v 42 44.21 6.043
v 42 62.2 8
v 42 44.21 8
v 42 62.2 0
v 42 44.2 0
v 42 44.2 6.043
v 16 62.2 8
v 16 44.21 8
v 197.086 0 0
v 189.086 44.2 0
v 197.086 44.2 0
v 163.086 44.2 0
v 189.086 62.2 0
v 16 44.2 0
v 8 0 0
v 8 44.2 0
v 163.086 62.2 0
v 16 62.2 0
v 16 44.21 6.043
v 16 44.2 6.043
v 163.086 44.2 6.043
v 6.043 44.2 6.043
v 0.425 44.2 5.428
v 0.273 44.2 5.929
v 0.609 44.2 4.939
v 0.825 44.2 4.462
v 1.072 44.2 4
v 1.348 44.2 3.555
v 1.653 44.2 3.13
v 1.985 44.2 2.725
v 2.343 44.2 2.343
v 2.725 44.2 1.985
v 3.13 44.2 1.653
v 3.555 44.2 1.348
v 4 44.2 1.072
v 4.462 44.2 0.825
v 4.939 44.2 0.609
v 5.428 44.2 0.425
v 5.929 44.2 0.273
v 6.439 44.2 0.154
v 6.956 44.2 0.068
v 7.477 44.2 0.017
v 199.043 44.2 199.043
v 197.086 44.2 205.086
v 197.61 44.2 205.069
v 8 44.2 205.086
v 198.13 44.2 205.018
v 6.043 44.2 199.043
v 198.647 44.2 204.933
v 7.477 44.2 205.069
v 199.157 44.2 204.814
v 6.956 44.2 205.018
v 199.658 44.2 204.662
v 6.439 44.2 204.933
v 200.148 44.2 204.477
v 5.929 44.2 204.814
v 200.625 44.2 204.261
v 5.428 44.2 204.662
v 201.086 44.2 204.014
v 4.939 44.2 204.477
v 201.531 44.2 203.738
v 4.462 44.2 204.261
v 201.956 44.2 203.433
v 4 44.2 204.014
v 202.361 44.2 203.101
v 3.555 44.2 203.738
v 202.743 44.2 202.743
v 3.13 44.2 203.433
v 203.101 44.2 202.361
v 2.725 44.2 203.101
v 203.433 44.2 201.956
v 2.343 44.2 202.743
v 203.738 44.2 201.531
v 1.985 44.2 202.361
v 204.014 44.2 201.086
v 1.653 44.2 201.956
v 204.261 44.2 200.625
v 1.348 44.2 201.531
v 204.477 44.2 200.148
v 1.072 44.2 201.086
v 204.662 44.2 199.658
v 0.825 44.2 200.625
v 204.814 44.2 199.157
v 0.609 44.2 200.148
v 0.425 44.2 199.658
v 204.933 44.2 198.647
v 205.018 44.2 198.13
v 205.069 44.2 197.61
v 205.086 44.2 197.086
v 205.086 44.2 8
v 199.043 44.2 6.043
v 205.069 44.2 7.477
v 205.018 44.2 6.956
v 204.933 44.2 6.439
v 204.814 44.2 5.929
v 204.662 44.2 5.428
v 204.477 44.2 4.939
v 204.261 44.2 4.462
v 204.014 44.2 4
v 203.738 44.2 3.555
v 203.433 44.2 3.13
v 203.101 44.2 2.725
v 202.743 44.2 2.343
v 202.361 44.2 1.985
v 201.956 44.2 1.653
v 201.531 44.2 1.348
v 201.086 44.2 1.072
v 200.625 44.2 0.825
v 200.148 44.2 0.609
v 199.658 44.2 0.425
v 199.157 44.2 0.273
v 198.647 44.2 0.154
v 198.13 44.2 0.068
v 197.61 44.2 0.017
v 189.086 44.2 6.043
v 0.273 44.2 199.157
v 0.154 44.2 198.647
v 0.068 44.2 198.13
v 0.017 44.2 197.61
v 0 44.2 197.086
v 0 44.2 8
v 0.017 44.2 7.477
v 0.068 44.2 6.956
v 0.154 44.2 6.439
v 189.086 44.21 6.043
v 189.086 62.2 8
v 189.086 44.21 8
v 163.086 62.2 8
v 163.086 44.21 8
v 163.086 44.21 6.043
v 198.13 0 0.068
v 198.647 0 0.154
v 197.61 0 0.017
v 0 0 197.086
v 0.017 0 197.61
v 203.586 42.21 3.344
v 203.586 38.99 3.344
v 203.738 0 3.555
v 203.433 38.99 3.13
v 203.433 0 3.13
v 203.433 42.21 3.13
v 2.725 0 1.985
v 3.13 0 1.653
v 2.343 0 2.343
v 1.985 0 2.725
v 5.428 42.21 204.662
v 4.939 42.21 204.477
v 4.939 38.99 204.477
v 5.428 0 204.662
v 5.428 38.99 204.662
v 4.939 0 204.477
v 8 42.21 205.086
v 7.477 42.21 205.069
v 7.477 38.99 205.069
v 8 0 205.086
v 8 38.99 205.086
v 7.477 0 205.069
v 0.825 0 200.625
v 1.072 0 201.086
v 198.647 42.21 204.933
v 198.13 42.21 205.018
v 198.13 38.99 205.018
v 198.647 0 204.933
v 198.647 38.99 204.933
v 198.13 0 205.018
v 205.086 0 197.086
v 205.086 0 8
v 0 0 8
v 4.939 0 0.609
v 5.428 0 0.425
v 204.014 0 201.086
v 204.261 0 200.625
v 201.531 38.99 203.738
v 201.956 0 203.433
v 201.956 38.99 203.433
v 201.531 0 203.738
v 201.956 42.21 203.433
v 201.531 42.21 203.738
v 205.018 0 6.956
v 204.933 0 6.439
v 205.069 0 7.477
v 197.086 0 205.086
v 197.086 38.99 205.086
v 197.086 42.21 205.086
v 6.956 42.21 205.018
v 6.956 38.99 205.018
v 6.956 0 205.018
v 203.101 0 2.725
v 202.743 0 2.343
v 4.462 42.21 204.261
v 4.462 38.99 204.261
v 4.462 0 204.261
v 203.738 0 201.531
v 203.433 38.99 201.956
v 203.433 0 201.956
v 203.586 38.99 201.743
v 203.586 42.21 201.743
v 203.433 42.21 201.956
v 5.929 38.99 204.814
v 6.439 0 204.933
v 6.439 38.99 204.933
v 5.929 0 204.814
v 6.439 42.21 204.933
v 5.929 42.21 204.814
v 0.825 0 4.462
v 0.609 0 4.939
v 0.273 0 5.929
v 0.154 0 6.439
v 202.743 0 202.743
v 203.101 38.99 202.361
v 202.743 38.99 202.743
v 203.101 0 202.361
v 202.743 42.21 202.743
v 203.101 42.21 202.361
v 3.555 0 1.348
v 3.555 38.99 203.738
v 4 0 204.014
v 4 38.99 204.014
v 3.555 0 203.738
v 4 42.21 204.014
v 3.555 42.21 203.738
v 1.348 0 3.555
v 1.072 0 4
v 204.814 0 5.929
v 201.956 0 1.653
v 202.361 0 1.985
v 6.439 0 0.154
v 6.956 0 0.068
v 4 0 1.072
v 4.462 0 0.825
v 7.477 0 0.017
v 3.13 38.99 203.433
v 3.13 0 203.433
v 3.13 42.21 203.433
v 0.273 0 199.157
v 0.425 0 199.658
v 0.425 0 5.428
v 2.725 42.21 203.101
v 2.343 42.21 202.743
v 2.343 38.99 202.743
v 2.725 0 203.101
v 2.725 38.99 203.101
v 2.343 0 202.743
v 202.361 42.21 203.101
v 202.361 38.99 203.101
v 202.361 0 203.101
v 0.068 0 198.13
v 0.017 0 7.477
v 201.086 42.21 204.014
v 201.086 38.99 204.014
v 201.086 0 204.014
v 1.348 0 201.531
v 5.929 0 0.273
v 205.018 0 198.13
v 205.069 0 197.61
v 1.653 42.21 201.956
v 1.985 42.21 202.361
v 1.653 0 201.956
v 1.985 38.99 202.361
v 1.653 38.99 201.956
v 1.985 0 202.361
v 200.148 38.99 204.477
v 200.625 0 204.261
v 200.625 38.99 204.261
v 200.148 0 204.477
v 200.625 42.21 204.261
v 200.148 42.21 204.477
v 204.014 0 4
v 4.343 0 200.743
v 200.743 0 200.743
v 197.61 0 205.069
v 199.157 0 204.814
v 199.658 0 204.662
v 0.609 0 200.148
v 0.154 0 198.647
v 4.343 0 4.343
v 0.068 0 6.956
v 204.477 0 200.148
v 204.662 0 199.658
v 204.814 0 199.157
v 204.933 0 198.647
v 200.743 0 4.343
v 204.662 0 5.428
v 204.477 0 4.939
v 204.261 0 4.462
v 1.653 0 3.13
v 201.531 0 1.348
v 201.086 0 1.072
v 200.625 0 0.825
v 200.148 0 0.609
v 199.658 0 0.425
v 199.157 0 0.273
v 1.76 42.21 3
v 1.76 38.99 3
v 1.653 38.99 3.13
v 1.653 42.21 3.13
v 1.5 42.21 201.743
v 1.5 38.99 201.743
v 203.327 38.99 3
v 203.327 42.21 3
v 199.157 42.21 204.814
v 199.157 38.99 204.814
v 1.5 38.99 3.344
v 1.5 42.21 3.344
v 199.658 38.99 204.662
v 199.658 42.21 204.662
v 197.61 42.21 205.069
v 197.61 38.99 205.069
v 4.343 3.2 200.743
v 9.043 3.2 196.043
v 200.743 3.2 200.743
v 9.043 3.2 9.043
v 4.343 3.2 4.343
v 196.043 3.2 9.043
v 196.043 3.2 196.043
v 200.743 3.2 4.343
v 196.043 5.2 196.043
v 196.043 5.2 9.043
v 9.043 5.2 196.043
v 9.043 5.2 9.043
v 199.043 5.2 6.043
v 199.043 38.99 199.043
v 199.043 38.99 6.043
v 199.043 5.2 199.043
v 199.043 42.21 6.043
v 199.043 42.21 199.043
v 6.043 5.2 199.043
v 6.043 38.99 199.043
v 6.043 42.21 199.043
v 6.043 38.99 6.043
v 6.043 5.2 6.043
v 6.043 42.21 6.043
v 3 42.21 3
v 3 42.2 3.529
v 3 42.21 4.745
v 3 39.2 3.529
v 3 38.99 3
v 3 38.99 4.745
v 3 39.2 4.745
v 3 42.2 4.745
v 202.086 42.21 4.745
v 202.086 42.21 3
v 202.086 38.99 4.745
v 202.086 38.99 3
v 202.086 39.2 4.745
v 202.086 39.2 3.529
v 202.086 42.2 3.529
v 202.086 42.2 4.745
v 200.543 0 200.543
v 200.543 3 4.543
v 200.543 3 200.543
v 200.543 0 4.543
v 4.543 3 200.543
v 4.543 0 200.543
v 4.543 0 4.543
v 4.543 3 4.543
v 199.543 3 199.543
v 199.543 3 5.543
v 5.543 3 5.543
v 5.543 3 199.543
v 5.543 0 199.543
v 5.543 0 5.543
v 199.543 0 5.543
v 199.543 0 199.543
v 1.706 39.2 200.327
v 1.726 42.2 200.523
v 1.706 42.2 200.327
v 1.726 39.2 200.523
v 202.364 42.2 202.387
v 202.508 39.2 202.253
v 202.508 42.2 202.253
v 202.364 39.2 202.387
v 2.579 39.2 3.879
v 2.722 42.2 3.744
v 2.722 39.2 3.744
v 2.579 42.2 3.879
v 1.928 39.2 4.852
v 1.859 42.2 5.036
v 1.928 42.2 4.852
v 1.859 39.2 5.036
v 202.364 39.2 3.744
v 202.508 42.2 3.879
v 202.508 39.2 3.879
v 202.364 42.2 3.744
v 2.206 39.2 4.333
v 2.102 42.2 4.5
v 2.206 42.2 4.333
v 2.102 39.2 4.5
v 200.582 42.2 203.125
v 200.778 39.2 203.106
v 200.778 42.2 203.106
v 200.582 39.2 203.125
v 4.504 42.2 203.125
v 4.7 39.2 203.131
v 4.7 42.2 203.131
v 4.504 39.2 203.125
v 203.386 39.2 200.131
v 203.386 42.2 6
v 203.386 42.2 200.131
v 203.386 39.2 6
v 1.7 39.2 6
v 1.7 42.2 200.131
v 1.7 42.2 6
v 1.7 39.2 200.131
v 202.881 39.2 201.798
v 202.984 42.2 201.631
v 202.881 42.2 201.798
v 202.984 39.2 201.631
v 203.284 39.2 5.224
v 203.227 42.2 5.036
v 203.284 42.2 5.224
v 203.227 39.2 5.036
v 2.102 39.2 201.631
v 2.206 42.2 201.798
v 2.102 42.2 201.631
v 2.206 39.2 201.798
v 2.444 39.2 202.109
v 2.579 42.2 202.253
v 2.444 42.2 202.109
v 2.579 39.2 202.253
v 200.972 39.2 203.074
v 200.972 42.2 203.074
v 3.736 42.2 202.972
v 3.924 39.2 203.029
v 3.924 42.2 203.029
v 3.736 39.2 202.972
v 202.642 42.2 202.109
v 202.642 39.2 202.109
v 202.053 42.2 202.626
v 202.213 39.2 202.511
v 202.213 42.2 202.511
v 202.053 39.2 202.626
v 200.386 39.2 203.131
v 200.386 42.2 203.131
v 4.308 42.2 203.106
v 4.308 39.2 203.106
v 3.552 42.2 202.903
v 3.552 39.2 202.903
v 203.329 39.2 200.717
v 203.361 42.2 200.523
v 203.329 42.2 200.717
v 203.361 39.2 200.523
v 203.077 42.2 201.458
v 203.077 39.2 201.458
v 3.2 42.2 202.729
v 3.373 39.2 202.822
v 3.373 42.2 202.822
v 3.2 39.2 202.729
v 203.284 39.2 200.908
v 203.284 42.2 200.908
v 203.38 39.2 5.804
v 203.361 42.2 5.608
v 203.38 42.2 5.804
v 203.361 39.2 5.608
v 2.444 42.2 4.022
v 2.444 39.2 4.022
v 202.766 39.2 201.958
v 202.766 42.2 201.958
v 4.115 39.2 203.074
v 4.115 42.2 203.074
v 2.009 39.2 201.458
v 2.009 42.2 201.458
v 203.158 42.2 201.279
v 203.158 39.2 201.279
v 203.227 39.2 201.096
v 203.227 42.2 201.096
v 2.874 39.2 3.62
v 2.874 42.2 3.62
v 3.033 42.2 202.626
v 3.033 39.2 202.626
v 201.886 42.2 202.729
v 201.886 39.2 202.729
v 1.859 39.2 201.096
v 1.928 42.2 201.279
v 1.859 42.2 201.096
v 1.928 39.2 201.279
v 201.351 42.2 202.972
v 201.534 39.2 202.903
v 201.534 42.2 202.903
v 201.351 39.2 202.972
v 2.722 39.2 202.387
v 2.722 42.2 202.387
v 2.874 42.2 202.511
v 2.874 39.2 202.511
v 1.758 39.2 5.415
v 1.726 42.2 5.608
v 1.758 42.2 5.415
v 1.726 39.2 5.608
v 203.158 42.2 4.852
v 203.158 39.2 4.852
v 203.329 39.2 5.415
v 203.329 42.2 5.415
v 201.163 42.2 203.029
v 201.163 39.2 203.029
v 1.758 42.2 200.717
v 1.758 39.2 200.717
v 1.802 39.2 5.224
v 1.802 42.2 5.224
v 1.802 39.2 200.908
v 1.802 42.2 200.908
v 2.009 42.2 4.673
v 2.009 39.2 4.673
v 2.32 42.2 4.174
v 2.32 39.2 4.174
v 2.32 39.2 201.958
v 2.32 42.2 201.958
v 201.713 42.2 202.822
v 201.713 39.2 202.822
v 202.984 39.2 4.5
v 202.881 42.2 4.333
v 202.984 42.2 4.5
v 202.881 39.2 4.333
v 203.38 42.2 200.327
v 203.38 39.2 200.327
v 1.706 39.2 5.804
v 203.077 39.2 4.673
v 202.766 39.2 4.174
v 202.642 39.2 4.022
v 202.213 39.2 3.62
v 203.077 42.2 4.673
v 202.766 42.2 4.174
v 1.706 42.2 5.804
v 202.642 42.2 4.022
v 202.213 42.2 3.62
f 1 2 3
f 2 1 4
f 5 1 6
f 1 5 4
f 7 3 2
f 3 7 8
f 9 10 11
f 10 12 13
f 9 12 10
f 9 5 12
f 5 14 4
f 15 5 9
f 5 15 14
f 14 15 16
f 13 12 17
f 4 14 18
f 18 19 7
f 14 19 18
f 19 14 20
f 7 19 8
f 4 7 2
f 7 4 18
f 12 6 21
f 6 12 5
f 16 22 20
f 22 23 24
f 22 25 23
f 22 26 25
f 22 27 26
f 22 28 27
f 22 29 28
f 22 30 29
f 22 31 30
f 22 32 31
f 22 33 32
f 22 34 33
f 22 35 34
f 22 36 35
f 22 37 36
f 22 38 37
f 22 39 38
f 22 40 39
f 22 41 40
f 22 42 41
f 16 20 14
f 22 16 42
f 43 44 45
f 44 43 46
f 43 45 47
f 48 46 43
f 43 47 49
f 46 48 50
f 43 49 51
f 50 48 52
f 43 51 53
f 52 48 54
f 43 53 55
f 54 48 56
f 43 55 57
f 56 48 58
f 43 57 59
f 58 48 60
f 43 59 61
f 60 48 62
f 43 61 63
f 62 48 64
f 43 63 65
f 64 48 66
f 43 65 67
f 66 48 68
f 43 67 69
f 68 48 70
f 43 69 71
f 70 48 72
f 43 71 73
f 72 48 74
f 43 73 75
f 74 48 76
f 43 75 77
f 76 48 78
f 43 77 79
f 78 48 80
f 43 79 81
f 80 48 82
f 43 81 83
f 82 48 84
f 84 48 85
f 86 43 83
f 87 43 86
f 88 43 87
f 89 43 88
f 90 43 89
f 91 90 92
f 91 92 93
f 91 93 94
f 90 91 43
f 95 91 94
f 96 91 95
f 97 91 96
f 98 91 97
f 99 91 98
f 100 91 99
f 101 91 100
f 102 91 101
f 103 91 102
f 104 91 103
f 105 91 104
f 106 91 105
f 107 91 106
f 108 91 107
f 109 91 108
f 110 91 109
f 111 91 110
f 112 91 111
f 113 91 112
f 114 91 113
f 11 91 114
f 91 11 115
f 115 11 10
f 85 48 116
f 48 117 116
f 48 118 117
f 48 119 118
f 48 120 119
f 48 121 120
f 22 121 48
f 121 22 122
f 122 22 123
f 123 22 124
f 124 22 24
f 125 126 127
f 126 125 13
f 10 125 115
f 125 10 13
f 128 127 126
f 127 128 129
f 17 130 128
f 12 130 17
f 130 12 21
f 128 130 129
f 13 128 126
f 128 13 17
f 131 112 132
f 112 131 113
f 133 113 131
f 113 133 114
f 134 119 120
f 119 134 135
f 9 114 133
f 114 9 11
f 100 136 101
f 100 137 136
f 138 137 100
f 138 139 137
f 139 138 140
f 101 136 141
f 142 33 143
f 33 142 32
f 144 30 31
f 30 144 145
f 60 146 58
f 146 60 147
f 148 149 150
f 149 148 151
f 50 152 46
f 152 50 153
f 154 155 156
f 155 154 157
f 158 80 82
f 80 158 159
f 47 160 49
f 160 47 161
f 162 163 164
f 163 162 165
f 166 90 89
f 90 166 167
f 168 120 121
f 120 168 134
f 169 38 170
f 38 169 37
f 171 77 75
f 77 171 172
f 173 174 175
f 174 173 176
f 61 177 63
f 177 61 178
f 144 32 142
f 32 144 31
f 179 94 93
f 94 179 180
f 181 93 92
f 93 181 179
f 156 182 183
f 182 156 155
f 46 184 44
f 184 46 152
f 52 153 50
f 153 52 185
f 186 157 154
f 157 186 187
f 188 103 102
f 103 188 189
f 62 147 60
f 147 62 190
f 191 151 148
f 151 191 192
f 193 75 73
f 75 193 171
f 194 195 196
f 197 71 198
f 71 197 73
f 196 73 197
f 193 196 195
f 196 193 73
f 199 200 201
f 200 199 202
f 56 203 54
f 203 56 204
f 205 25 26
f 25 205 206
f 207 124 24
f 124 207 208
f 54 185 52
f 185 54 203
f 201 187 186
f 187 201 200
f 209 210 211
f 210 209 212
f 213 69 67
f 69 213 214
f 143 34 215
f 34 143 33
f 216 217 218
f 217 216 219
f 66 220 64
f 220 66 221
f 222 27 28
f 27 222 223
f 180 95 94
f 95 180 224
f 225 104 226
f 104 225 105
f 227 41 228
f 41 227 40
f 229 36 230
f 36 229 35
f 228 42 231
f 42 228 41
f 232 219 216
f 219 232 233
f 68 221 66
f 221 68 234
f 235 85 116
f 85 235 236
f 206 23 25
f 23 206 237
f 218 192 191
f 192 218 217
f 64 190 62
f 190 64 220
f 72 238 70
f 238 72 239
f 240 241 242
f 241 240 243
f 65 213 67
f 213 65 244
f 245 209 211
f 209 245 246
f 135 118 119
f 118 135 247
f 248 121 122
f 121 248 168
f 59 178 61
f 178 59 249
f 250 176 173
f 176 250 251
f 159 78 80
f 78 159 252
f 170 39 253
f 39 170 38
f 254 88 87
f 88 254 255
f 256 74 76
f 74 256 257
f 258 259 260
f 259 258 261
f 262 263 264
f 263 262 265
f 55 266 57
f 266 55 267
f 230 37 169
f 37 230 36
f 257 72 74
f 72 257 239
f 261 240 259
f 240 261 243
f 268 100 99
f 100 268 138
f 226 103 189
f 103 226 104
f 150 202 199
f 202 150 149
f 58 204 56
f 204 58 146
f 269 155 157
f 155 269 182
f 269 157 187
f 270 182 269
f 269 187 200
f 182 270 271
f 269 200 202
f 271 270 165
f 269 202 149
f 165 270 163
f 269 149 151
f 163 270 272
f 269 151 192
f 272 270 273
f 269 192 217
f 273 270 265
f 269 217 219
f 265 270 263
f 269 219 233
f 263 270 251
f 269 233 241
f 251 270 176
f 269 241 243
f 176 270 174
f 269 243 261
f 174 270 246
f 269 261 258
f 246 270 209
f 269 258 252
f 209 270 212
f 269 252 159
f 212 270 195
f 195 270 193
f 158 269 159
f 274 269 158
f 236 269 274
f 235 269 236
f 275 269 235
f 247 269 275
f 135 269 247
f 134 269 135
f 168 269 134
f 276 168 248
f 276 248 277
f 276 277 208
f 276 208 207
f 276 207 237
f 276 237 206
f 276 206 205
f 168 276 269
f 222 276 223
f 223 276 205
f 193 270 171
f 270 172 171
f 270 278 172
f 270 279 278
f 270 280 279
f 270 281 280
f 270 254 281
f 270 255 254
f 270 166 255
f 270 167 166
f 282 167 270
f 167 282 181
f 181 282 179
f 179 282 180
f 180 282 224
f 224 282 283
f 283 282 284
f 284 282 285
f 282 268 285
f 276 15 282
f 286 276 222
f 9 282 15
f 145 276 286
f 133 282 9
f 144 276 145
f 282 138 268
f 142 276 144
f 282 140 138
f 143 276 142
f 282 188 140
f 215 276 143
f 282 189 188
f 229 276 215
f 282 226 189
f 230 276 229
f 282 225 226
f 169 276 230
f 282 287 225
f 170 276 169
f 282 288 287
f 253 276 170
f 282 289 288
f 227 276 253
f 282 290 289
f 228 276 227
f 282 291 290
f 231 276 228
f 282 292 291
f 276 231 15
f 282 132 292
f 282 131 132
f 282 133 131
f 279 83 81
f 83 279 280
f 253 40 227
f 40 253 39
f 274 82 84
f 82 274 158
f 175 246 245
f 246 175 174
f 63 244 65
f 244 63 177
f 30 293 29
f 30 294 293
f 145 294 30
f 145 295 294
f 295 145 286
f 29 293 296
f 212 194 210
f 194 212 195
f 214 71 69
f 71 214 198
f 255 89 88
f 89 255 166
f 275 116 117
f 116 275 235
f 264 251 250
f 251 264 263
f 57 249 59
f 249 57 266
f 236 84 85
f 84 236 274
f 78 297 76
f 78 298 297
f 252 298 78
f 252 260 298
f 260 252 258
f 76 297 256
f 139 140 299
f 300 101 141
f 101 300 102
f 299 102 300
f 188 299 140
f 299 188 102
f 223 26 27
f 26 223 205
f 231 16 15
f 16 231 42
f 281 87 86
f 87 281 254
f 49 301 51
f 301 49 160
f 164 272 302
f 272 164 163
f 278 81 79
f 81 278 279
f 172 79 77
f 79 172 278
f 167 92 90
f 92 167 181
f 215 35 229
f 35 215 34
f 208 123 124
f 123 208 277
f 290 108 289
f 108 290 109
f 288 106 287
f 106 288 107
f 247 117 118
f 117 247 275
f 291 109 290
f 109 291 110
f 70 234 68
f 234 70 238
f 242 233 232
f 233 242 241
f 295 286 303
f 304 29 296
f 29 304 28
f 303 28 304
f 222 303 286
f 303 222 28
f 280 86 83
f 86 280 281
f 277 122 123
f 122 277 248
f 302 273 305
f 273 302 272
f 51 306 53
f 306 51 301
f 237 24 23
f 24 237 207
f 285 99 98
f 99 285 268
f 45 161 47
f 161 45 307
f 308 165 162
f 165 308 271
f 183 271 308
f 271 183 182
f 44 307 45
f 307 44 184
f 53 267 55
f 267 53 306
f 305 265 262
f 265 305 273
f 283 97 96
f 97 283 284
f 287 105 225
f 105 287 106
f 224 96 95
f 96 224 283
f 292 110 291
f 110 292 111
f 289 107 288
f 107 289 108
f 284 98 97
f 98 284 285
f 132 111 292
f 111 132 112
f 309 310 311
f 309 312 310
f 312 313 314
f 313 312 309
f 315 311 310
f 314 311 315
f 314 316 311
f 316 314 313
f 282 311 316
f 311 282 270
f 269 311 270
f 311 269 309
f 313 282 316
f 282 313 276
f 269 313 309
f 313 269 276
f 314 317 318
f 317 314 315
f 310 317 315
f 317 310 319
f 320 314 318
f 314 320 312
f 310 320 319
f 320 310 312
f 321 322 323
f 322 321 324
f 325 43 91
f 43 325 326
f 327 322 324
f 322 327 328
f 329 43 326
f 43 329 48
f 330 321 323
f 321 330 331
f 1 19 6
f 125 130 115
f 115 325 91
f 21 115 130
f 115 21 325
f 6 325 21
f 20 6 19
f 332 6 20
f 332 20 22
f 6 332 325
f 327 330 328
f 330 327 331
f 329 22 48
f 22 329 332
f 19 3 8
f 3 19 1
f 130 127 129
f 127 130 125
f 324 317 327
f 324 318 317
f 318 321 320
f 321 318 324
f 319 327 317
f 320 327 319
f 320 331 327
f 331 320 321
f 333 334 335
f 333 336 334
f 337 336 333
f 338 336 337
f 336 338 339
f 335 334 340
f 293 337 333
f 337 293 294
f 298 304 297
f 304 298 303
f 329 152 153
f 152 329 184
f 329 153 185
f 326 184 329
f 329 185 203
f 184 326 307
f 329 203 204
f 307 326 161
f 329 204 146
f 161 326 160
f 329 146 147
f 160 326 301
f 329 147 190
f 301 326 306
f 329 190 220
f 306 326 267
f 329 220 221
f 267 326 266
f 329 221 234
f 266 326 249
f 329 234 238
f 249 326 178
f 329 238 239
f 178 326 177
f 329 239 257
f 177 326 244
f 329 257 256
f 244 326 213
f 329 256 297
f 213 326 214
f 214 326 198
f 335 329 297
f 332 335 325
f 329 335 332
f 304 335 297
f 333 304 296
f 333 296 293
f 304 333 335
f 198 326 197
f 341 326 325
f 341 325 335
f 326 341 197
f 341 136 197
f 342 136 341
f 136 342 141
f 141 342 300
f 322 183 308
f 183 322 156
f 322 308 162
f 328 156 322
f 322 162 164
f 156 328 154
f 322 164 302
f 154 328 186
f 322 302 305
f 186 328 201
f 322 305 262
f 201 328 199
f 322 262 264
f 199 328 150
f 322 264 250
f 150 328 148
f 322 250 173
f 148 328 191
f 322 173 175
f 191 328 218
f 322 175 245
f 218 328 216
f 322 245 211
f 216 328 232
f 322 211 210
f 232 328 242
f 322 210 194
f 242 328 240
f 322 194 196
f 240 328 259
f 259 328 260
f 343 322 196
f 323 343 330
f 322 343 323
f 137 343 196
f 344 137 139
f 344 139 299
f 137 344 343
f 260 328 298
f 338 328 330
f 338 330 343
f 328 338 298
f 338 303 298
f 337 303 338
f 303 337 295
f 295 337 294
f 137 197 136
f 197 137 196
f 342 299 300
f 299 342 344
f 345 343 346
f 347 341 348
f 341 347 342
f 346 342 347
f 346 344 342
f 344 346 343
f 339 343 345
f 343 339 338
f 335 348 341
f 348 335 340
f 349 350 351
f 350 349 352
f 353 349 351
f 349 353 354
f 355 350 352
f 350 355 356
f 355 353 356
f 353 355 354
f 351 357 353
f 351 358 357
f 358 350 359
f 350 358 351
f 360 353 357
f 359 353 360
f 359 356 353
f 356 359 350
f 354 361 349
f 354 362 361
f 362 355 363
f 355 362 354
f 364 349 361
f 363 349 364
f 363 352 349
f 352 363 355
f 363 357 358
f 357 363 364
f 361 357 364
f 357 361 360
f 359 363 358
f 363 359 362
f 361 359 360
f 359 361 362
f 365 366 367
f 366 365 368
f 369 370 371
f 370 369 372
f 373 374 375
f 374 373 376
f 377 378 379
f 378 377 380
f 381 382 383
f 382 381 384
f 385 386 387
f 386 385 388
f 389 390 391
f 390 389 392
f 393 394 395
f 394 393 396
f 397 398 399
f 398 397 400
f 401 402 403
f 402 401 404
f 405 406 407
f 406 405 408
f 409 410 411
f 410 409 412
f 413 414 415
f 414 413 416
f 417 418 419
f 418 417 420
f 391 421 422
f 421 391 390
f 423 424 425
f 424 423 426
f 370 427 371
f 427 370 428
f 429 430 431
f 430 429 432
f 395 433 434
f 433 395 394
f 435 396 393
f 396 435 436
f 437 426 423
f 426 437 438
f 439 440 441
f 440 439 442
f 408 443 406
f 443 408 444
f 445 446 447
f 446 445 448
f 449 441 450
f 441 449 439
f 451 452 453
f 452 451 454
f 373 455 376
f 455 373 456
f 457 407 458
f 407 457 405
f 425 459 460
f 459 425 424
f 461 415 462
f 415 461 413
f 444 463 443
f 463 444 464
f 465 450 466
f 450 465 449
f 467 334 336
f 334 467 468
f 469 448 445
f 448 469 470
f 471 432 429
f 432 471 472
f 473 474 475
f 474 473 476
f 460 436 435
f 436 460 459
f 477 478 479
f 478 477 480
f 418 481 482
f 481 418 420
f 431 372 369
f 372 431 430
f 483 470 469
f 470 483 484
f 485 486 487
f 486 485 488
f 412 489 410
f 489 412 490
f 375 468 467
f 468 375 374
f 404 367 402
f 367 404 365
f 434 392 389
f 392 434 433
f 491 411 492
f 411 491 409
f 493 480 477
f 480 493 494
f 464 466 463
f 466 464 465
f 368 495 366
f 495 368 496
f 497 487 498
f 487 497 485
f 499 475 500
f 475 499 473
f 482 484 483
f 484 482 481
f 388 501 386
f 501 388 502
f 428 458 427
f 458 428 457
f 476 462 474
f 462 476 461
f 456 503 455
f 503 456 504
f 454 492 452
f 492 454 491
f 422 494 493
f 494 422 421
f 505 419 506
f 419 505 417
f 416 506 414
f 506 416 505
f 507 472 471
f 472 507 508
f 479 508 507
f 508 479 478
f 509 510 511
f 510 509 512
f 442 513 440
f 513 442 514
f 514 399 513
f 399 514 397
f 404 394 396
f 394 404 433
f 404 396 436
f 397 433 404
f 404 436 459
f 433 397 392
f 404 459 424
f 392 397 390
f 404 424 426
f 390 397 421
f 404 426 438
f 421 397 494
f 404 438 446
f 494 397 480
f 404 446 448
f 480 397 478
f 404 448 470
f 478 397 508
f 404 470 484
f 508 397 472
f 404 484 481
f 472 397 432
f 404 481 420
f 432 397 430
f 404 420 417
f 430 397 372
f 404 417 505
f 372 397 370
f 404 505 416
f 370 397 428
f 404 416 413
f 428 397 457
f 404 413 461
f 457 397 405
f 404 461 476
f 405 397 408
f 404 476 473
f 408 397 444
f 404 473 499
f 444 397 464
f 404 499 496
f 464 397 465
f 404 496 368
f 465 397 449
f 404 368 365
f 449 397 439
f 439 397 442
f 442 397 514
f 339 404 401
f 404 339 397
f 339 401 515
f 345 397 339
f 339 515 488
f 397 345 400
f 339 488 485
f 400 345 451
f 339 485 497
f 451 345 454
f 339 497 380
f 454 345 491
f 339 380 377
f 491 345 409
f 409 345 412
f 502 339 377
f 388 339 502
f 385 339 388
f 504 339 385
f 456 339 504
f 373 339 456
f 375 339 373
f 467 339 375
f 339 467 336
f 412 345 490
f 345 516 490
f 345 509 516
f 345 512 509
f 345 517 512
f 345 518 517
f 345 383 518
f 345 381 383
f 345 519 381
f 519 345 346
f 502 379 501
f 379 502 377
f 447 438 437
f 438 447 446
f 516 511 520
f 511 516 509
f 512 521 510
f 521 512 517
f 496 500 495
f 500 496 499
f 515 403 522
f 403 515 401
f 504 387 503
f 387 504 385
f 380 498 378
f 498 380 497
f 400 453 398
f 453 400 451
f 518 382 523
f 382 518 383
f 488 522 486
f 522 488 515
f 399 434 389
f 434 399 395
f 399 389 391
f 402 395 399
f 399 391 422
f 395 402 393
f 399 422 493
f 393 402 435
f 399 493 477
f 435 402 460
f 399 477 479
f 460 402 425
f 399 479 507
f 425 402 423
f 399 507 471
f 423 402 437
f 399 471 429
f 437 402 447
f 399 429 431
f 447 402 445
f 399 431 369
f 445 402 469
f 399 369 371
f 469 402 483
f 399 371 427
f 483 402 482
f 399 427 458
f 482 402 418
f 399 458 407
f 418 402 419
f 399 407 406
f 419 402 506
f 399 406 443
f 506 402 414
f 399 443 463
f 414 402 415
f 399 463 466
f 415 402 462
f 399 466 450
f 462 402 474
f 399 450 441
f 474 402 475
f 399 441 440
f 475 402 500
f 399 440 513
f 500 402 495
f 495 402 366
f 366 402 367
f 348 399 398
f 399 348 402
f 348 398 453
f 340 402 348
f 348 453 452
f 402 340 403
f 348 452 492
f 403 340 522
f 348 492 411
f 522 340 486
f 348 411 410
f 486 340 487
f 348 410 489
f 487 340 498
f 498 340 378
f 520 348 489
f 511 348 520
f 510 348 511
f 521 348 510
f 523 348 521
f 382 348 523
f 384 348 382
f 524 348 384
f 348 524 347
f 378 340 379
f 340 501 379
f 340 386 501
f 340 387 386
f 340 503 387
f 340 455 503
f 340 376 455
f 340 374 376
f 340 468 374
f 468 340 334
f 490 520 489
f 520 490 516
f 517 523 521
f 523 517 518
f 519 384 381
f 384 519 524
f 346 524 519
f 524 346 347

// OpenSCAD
// OpenSCAD code for Hub74 64x64 LED Matrix with
// Adafruit MatrixPortal S3 development board incl.
// mounting holes and cutouts for USB-C and power connectors.
//
// Dimensions: https://learn.adafruit.com/assets/123526
// Units: mm
// Print orientation:
// - frame: rear side down
// - faceplate: flat on rear face
// - spacer: flat on panel side
// - backplate: flat on inner face
//
// Author: Andreas Merkle (web@blue-andi.de)
// License: MIT License (https://opensource.org/licenses/MIT)

// General parameters
factor_inc_to_mm = 25.4; // Conversion factor from inches to millimeters
eps = 0.01; // Small overlap for boolean operations in mm
fit_tolerance = 0.2; // General assembly clearance in mm
rounded_fn = 96; // Segment count for smooth rounded contours ($fn for frame/backplate corner rounding)

// Preview / export selection
part = "assembly"; // assembly, frame, faceplate, spacer, backplate
show_panel = false;
show_spacer = false;
show_board = false;

// Parameters LED matrix Hub75 panel
panel_width = 192; // Width of the LED matrix panel in mm
panel_height = 192; // Height of the LED matrix panel in mm
panel_depth = 15; // Depth of the LED matrix panel in mm

// Parameters AdaFruit Matrix Portal S3
board_width = 1.75 * factor_inc_to_mm; // Width of the MatrixPortal S3 board in mm
board_height = 2.50 * factor_inc_to_mm; // Height of the MatrixPortal S3 board in mm
board_depth = 20; // Depth of the MatrixPortal S3 board in mm
board_mounting_holes_h_distance = 1.6 * factor_inc_to_mm; // Distance between mounting holes in mm (1.6 inches converted to mm)
board_mounting_holes_v_distance = 0.78 * factor_inc_to_mm; // Distance between mounting holes in mm (0.78 inches converted to mm)
board_mounting_holes_diameter = 3.2; // Diameter of the mounting holes in mm
board_mounting_holes_offset_x = (board_width - board_mounting_holes_h_distance) / 2; // X offset of the mounting holes from the center of the board in mm
board_mounting_holes_offset_y = (board_height - board_mounting_holes_v_distance) / 2; // Y offset of the mounting holes from the center of the board in mm

// Parameters for the LED matrix panel spacer
spacer_thickness = 3; // Thickness of the spacer in mm
spacer_width = panel_width; // Width of the spacer in mm
spacer_height = panel_height; // Height of the spacer in mm

// Parameters for frame
frame_panel_space = 0.5; // Space between the frame and the LED matrix panel in mm
frame_wall_thickness = 3; // Thickness of the frame walls in mm
frame_corner_radius = 8; // Outer corner radius of the frame when viewed from the front in mm
frame_corner_clearance = frame_corner_radius > 0 ? frame_corner_radius * (1 - 1 / sqrt(2)) + fit_tolerance : 0; // Extra half-margin required so square plates still fit inside the rounded outer contour in mm
frame_corner_side_relief = frame_corner_radius > frame_wall_thickness ? frame_corner_radius - sqrt(pow(frame_corner_radius, 2) - pow(frame_corner_radius - frame_wall_thickness, 2)) : 0; // Loss of usable wall height at each rounded corner before full wall thickness is available in mm
frame_faceplate_outer_margin = 2; // Additional outer frame margin around the rectangular faceplate in mm (per side)
frame_faceplate_glue_lip = 1.5; // Glue lip behind the faceplate opening in mm
frame_panel_stop_depth = 2; // Depth of the panel stop behind the faceplate in mm
frame_panel_stop_overlap = 2.5; // Support overlap around the panel in mm
frame_rear_clearance = 1; // Clearance behind the board in mm
frame_foot_width = 26; // Width of one stand foot in X direction in mm
frame_foot_depth = 18; // Stand foot extension behind the frame in Y direction in mm
frame_foot_height = 8; // Stand foot height from the base in Z direction in mm
frame_foot_inset = 16; // Distance from outer frame side to stand foot in mm
frame_width = max(panel_width + 2 * frame_panel_space + 2 * frame_wall_thickness, panel_width + 4 + 2 * frame_corner_clearance + 2 * frame_faceplate_outer_margin); // Total width of the frame in mm
frame_height = max(panel_height + 2 * frame_panel_space + 2 * frame_wall_thickness, panel_height + 4 + 2 * frame_corner_clearance + 2 * frame_faceplate_outer_margin); // Total height of the frame in mm

// Parameters faceplate
faceplate_width = panel_width + 4; // Width of the faceplate in mm
faceplate_height = panel_height + 4; // Height of the faceplate in mm
faceplate_thickness = 3; // Thickness of the faceplate in mm
faceplate_cutout_panel_space = 1; // Space between the faceplate cutout and the LED matrix panel in mm
faceplate_cutout_width = panel_width + 2 * faceplate_cutout_panel_space; // Width of the faceplate cutout in mm
faceplate_cutout_height = panel_height + 2 * faceplate_cutout_panel_space; // Height of the faceplate cutout in mm
faceplate_recess_width = faceplate_width + 2 * fit_tolerance; // Pocket width for the faceplate in mm
faceplate_recess_height = faceplate_height + 2 * fit_tolerance; // Pocket height for the faceplate in mm
faceplate_recess_depth = faceplate_thickness + fit_tolerance; // Pocket depth for the faceplate in mm

// Parameters for board assembly on the spacer
board_thickness = 1.6; // Approximate PCB thickness in mm
board_standoff_height = 6; // Distance between spacer and board in mm
board_component_depth = board_depth - board_thickness - board_standoff_height; // Remaining depth for components in mm
board_mounting_standoff_diameter = 7; // Diameter of the spacer standoffs in mm
board_mounting_hole_clearance = board_mounting_holes_diameter + 0.4; // Clearance through hole in the spacer in mm

// Parameters for panel to spacer fastening
panel_mount_hole_inset = 8; // Configurable inset for panel/spacer mounting holes in mm
panel_mount_hole_diameter = 3.2; // Diameter of the panel/spacer mounting holes in mm

// Parameters for backplate
backplate_thickness = frame_wall_thickness; // Thickness of the backplate in mm
backplate_corner_radius = 3; // Corner radius of the backplate in mm for better fit in the rounded frame contour
backplate_slot_depth = 1.5; // Depth of the rail groove into each side wall in mm
backplate_slot_wall = 2.0; // Thickness of the rear wall behind the backplate slot in mm
backplate_bottom_stop_height = frame_wall_thickness; // Bottom stop for the sliding backplate in mm
backplate_top_clearance = frame_corner_side_relief + fit_tolerance; // Required clearance below the rounded top corners so the side slots stay closed in mm
backplate_top_opening_extra = fit_tolerance + 0.6; // Additional insertion relief above geometric minimum in mm
backplate_top_opening_side_relief = 0; // Keep side walls intact so guide grooves are not widened away in mm
backplate_top_opening_x = max(0, frame_wall_thickness - backplate_slot_depth - backplate_top_opening_side_relief); // Distance of top slot opening start from outer side wall in mm

// Derived housing dimensions
panel_cavity_width = panel_width + 2 * frame_panel_space;
panel_cavity_height = panel_height + 2 * frame_panel_space;
panel_cavity_depth_start = faceplate_recess_depth + frame_panel_stop_depth;
frame_depth = panel_cavity_depth_start + panel_depth + spacer_thickness + board_depth + frame_rear_clearance; // Body depth of the frame in mm
panel_stop_opening_width = panel_width - 2 * frame_panel_stop_overlap;
panel_stop_opening_height = panel_height - 2 * frame_panel_stop_overlap;
frame_front_opening_width = faceplate_cutout_width - 2 * frame_faceplate_glue_lip;
frame_front_opening_height = faceplate_cutout_height - 2 * frame_faceplate_glue_lip;
backplate_width = frame_width - 2 * (frame_wall_thickness - backplate_slot_depth) - 2 * fit_tolerance;
backplate_height = frame_height - backplate_bottom_stop_height - backplate_top_clearance;
backplate_top_opening_corner_depth = backplate_top_opening_x < frame_corner_radius ? frame_corner_radius - sqrt(pow(frame_corner_radius, 2) - pow(frame_corner_radius - backplate_top_opening_x, 2)) : 0; // Corner intrusion depth at the actual top slot opening X position in mm
backplate_top_opening_depth_raw = backplate_height + fit_tolerance; // Minimum opening depth required to insert the full backplate height from the top in mm
backplate_top_opening_depth = max(backplate_top_opening_depth_raw, backplate_top_opening_corner_depth + backplate_top_opening_extra); // Effective top opening depth: full insertion requirement plus corner clearance in mm
backplate_bottom_z = backplate_bottom_stop_height;

function centered_offset(outer, inner) = (outer - inner) / 2;

module rounded_visual_cube(size_xyz, color_name, alpha_value=1.0)
{
	color(color_name, alpha_value)
		cube(size_xyz);
}

module cutout_cube(offset_xyz, size_xyz)
{
	translate(offset_xyz)
		cube(size_xyz);
}

module rounded_profile_xz(width, height, radius)
{
	$fn = rounded_fn;

	if (radius > 0)
	{
		translate([radius, radius])
			offset(r=radius)
				square([width - 2 * radius, height - 2 * radius]);
	}
	else
	{
		square([width, height]);
	}
}

module rounded_cube_xz(size_xyz, radius)
{
	translate([0, size_xyz[1], 0])
		rotate([90, 0, 0])
			linear_extrude(height=size_xyz[1])
				rounded_profile_xz(size_xyz[0], size_xyz[2], radius);
}

module frame_stand_feet()
{
	left_foot_x = frame_foot_inset;
	right_foot_x = frame_width - frame_foot_inset - frame_foot_width;

	translate([left_foot_x, frame_depth, 0])
		cube([frame_foot_width, frame_foot_depth, frame_foot_height]);

	translate([right_foot_x, frame_depth, 0])
		cube([frame_foot_width, frame_foot_depth, frame_foot_height]);
}

module y_hole_from_back(x_pos, z_pos, diameter, depth)
{
	translate([x_pos, frame_depth - depth - eps, z_pos])
		rotate([-90, 0, 0])
			cylinder(d=diameter, h=depth + 2 * eps, $fn=48);
}

module local_y_hole(x_pos, y_pos, z_pos, diameter, depth)
{
	translate([x_pos, y_pos - eps, z_pos])
		rotate([-90, 0, 0])
			cylinder(d=diameter, h=depth + 2 * eps, $fn=48);
}

module board_mount_pattern(hole_diameter, depth, standoff_diameter=0)
{
	hole_positions = [
		[board_mounting_holes_offset_x, board_mounting_holes_offset_y],
		[board_width - board_mounting_holes_offset_x, board_mounting_holes_offset_y],
		[board_mounting_holes_offset_x, board_height - board_mounting_holes_offset_y],
		[board_width - board_mounting_holes_offset_x, board_height - board_mounting_holes_offset_y]
	];

	for (position = hole_positions)
	{
		translate([position[0], 0, position[1]])
		{
			if (standoff_diameter > 0)
			{
				cylinder(d=standoff_diameter, h=depth, $fn=48);
			}

			translate([0, -eps, 0])
				cylinder(d=hole_diameter, h=depth + 2 * eps, $fn=48);
		}
	}
}

module panel_mount_pattern(hole_diameter, depth)
{
	hole_positions = [
		[panel_mount_hole_inset, panel_mount_hole_inset],
		[panel_width - panel_mount_hole_inset, panel_mount_hole_inset],
		[panel_mount_hole_inset, panel_height - panel_mount_hole_inset],
		[panel_width - panel_mount_hole_inset, panel_height - panel_mount_hole_inset]
	];

	for (position = hole_positions)
	{
		translate([position[0], -eps, position[1]])
			cylinder(d=hole_diameter, h=depth + 2 * eps, $fn=48);
	}
}

module faceplate()
{
	difference()
	{
		cube([faceplate_width, faceplate_thickness, faceplate_height]);

		cutout_cube(
			[centered_offset(faceplate_width, faceplate_cutout_width), -eps, centered_offset(faceplate_height, faceplate_cutout_height)],
			[faceplate_cutout_width, faceplate_thickness + 2 * eps, faceplate_cutout_height]
		);
	}
}

module panel()
{
	difference()
	{
		cube([panel_width, panel_depth, panel_height]);
		panel_mount_pattern(panel_mount_hole_diameter, panel_depth);
	}
}

module spacer()
{
	difference()
	{
		union()
		{
			cube([spacer_width, spacer_thickness, spacer_height]);

			translate([
				centered_offset(spacer_width, board_width),
				spacer_thickness,
				centered_offset(spacer_height, board_height)
			])
				difference()
				{
					board_mount_pattern(board_mounting_hole_clearance, board_standoff_height, board_mounting_standoff_diameter);
				}
		}

		panel_mount_pattern(panel_mount_hole_diameter, spacer_thickness);

		translate([
			centered_offset(spacer_width, board_width),
			spacer_thickness,
			centered_offset(spacer_height, board_height)
		])
			board_mount_pattern(board_mounting_hole_clearance, board_standoff_height + eps);
	}
}

module board()
{
	union()
	{
		color("DarkGreen", 1.0)
			cube([board_width, board_thickness, board_height]);

		if (board_component_depth > 0)
		{
			color("DimGray", 0.9)
				translate([4, board_thickness, 4])
					cube([
						board_width - 8,
						board_component_depth,
						board_height - 8
					]);
		}
	}
}

module backplate()
{
	rounded_cube_xz(
		[backplate_width, backplate_thickness, backplate_height],
		min(backplate_corner_radius, min(backplate_width, backplate_height) / 2)
	);
}

module frame()
{
	difference()
	{
		union()
		{
			rounded_cube_xz([frame_width, frame_depth, frame_height], frame_corner_radius);
			frame_stand_feet();
		}

		// Front opening behind the glued faceplate.
		cutout_cube(
			[
				centered_offset(frame_width, frame_front_opening_width),
				-eps,
				centered_offset(frame_height, frame_front_opening_height)
			],
			[frame_front_opening_width, faceplate_recess_depth + eps, frame_front_opening_height]
		);

		// Flush front pocket for the faceplate.
		cutout_cube(
			[
				centered_offset(frame_width, faceplate_recess_width),
				-eps,
				centered_offset(frame_height, faceplate_recess_height)
			],
			[faceplate_recess_width, faceplate_recess_depth + eps, faceplate_recess_height]
		);

		// Opening in the panel stop ring. The panel is inserted from the rear and rests here.
		cutout_cube(
			[
				centered_offset(frame_width, panel_stop_opening_width),
				faceplate_recess_depth - eps,
				centered_offset(frame_height, panel_stop_opening_height)
			],
			[panel_stop_opening_width, frame_panel_stop_depth + 2 * eps, panel_stop_opening_height]
		);

		// Main rear cavity for panel, spacer, and board.
		cutout_cube(
			[
				centered_offset(frame_width, panel_cavity_width),
				panel_cavity_depth_start,
				centered_offset(frame_height, panel_cavity_height)
			],
			[panel_cavity_width, frame_depth - panel_cavity_depth_start + eps, panel_cavity_height]
		);

		// Rear guide channel (main portion above snap zone) - full width for easy slide-in.
		// Left wall rail slot - grips the left edge of the backplate in the depth (Y) direction.
		cutout_cube(
			[
				frame_wall_thickness - backplate_slot_depth,
				frame_depth - backplate_slot_wall - backplate_thickness - fit_tolerance - eps,
				backplate_bottom_z
			],
			[
				backplate_slot_depth,
				backplate_thickness + fit_tolerance + 2 * eps,
				backplate_height + eps
			]
		);

		// Right wall rail slot - grips the right edge of the backplate in the depth (Y) direction.
		cutout_cube(
			[
				frame_width - frame_wall_thickness,
				frame_depth - backplate_slot_wall - backplate_thickness - fit_tolerance - eps,
				backplate_bottom_z
			],
			[
				backplate_slot_depth,
				backplate_thickness + fit_tolerance + 2 * eps,
				backplate_height + eps
			]
		);

		// Top wall center opening - allows the backplate to be inserted from above.
		// Z start is lowered by backplate_top_opening_depth to clear the rounded corner
		// material that intrudes at the rail slot X positions.
		cutout_cube(
			[
				frame_wall_thickness - backplate_slot_depth - backplate_top_opening_side_relief,
				frame_depth - backplate_slot_wall - backplate_thickness - fit_tolerance - eps,
				frame_height - backplate_top_opening_depth - eps
			],
			[
				frame_width - 2 * (frame_wall_thickness - backplate_slot_depth) + 2 * backplate_top_opening_side_relief,
				backplate_thickness + fit_tolerance + 2 * eps,
				backplate_top_opening_depth + 2 * eps
			]
		);
	}
}

module assembly()
{
	faceplate_position = [
		centered_offset(frame_width, faceplate_width),
		0,
		centered_offset(frame_height, faceplate_height)
	];
	panel_position = [
		centered_offset(frame_width, panel_width),
		panel_cavity_depth_start,
		centered_offset(frame_height, panel_height)
	];
	spacer_position = [
		centered_offset(frame_width, spacer_width),
		panel_cavity_depth_start + panel_depth,
		centered_offset(frame_height, spacer_height)
	];
	board_position = [
		centered_offset(frame_width, board_width),
		panel_cavity_depth_start + panel_depth + spacer_thickness + board_standoff_height,
		centered_offset(frame_height, board_height)
	];
	backplate_position = [
		frame_wall_thickness - backplate_slot_depth + fit_tolerance,
		frame_depth - backplate_slot_wall - backplate_thickness,
		backplate_bottom_z
	];

	color("SlateGray", 0.95)
		frame();

	color("Gainsboro", 1.0)
		translate(faceplate_position)
			faceplate();

	if (show_panel)
	{
		color("Black", 0.8)
			translate(panel_position)
				panel();
	}

	if (show_spacer)
	{
		color("Silver", 0.85)
			translate(spacer_position)
				spacer();
	}

	if (show_board)
	{
		translate(board_position)
			board();
	}

	color("LightSteelBlue", 0.9)
		translate(backplate_position)
			backplate();
}

if (part == "frame")
{
	frame();
}
else if (part == "faceplate")
{
	faceplate();
}
else if (part == "spacer")
{
	spacer();
}
else if (part == "backplate")
{
	backplate();
}
else
{
	assembly();
}
